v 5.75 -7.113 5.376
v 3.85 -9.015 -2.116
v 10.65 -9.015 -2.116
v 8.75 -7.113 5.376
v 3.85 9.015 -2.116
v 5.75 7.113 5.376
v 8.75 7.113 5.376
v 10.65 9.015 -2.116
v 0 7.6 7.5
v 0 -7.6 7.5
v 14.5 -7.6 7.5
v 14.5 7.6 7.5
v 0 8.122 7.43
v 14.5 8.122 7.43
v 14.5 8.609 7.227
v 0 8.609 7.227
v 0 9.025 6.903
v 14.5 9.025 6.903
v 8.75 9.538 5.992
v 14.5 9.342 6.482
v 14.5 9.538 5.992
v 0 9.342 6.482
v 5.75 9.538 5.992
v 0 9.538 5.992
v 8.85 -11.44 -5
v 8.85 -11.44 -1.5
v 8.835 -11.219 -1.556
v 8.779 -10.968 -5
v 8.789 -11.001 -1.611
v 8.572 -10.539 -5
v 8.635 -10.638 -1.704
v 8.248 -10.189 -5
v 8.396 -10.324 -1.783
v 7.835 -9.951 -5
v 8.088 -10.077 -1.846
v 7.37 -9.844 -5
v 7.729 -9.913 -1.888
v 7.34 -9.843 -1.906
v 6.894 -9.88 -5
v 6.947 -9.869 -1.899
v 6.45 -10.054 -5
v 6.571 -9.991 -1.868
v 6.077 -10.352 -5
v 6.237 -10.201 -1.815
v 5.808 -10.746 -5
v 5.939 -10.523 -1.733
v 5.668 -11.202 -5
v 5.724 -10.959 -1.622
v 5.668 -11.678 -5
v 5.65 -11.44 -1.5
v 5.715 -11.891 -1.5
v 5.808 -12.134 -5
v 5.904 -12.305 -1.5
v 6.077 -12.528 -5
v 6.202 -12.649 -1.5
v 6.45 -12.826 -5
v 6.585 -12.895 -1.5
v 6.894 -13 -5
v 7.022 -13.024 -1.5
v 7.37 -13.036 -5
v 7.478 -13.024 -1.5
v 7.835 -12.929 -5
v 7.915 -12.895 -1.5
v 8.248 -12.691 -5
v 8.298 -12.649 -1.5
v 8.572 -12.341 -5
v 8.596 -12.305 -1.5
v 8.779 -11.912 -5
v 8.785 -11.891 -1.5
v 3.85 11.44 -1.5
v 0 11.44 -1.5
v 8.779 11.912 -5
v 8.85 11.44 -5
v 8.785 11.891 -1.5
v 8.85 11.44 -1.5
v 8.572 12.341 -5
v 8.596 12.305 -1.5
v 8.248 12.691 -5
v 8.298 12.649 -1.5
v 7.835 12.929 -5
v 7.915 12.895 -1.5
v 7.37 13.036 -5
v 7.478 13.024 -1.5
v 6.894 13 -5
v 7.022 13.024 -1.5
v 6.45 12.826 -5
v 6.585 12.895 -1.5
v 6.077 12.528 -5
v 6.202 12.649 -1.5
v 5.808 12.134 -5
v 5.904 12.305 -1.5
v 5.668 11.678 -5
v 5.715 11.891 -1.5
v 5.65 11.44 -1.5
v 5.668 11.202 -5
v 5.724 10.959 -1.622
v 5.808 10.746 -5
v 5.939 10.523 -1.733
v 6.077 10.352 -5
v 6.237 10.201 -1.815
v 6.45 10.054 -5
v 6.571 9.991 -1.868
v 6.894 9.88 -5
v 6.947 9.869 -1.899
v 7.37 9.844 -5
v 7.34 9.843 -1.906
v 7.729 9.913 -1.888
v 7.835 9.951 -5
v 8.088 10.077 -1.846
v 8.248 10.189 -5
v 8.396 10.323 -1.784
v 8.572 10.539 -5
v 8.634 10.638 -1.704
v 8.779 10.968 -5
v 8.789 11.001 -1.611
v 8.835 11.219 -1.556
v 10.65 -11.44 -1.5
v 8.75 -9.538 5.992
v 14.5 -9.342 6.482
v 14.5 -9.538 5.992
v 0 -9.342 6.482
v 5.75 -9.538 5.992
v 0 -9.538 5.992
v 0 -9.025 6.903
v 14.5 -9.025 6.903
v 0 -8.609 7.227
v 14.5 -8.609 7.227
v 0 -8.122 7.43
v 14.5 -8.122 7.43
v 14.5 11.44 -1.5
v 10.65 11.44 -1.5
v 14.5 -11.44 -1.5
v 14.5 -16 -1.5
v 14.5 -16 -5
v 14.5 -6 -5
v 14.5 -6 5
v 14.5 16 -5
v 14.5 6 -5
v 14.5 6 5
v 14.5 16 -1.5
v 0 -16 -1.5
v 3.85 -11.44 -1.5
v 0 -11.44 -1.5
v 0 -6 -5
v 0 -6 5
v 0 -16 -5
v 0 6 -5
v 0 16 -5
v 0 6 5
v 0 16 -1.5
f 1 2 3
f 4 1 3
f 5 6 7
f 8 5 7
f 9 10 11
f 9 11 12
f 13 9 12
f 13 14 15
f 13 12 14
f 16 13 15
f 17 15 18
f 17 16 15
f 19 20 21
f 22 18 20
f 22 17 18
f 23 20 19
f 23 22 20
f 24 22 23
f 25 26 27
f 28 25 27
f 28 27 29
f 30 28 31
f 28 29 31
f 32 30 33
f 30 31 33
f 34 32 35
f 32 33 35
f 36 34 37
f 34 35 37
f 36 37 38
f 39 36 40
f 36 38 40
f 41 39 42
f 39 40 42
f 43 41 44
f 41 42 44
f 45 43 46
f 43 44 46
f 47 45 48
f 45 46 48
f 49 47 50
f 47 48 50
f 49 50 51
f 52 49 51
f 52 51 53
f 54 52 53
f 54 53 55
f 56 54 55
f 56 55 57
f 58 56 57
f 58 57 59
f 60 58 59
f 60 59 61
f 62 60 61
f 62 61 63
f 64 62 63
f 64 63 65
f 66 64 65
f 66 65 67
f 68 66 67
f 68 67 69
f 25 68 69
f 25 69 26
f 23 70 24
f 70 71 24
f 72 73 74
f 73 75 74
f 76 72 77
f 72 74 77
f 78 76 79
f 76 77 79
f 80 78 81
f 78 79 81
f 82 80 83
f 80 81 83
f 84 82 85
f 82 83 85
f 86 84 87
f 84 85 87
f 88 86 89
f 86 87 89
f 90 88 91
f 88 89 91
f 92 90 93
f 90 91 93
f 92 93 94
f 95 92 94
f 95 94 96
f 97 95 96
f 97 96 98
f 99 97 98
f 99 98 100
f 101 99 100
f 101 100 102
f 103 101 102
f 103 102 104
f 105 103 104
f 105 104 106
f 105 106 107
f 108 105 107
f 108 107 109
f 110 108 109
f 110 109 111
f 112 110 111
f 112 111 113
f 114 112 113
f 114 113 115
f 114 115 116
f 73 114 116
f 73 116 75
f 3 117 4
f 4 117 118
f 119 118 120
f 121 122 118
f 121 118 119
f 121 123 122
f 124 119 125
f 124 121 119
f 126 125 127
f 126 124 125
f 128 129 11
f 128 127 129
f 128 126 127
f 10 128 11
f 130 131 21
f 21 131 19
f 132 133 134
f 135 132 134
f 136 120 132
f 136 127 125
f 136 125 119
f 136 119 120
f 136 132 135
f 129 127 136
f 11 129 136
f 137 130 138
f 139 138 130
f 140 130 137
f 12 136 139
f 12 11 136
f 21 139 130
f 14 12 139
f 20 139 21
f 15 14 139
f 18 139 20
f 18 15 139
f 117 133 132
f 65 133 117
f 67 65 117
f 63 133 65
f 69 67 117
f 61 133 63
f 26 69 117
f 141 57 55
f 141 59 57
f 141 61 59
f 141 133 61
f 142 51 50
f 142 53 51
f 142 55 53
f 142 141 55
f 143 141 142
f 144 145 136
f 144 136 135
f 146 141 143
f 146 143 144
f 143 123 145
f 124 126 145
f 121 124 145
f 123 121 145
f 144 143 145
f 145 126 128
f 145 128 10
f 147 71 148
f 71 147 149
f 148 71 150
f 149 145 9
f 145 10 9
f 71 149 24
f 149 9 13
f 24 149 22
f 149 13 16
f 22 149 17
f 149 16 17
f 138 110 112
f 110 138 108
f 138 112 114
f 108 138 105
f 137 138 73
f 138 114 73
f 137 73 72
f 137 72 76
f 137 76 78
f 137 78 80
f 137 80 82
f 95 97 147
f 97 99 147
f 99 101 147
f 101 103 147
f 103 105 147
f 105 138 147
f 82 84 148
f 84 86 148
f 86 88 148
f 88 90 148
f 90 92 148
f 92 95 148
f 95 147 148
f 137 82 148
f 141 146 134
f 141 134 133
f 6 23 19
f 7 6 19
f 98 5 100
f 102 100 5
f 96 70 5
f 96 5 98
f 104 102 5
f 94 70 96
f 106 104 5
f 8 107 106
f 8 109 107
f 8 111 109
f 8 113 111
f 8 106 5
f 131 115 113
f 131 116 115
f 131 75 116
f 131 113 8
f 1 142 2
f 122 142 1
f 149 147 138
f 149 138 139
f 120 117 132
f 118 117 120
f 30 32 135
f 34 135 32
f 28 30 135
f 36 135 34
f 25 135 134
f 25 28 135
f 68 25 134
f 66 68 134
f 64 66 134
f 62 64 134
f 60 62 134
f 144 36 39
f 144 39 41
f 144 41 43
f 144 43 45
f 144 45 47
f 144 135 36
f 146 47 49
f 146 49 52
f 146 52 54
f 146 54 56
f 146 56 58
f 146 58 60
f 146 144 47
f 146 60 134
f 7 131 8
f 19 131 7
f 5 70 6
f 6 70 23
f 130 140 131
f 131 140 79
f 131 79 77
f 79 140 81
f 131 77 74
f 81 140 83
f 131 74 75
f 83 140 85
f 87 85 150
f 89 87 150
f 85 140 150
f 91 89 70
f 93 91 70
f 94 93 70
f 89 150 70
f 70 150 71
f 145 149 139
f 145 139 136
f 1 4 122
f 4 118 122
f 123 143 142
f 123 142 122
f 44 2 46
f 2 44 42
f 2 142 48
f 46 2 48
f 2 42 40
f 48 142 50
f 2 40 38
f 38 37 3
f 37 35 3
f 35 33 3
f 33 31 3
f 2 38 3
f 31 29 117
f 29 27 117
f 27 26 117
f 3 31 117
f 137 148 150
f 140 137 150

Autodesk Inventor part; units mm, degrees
ref_plane "YZ Plane" through (0, 0, 0) normal (1, 0, 0) x (0, 1, 0)
ref_plane "XZ Plane" through (0, 0, 0) normal (0, 1, 0) x (-1, 0, 0)
ref_plane "XY Plane" through (0, 0, 0) normal (0, 0, 1) x (1, 0, 0)
sketch "Sketch1" plane through (0, 0, 0) normal (1, 0, 0) x (0, 1, 0)
  line L0 (-6, -5) -> (0, -5) construction
  line L1 (6, -5) -> (6, 5)
  line L2 (6, 5) -> (-6, 5)
  line L3 (-6, 5) -> (-6, -5)
  line L4 (-6, -5) -> (6, 5) construction
  line L5 (6, -5) -> (-6, 5) construction
  line L6 (-7.5995, 7.5) -> (7.5995, 7.5)
  line L7 (9.1552, -7.5) -> (-9.1552, 7.5) construction
  line L8 (-9.1552, -7.5) -> (9.1552, 7.5) construction
  line L9 (9.1552, -7.5) -> (9, -7.5)
  line L10 (-9, -7.5) -> (-9.1552, -7.5)
  line L11 (-6, -5) -> (-16, -5)
  line L12 (-16, -5) -> (-16, -1.5)
  line L13 (-16, -1.5) -> (-11.44, -1.5)
  line L14 (-11.44, -1.5) -> (-9.538, 5.9921)
  line L15 (0, 0) -> (0, 13.1521) construction
  line L16 (9.1552, -7.5) -> (-9.1552, 7.5) construction
  line L17 (9, -7.5) -> (9.1552, -7.5)
  line L18 (6, -5) -> (16, -5)
  line L19 (16, -5) -> (16, -1.5)
  line L20 (16, -1.5) -> (11.44, -1.5)
  line L21 (11.44, -1.5) -> (9.538, 5.9921)
  arc A0 (-7.5995, 7.5) -> (-9.538, 5.9921) centre (-7.5995, 5.5) ccw
  arc A1 (9.538, 5.9921) -> (7.5995, 7.5) centre (7.5995, 5.5) ccw
  dimension "d0" = 12
  dimension "d1" = 10
  dimension "d2" = 2.5
  dimension "d3" = 10
  dimension "d4" = 3.5
  dimension "d5" = 4.56
  dimension "d6" = 2
extrude "Extrusion1" add sketch "Sketch1" along normal blind 14.5
sketch "Sketch2" plane through (0, 9.538, 5.9921) normal (0, 0.9693, 0.2461) x (1, 0, 0)
  line L0 (0, 7.7298) -> (14.5, 7.7298) projected
  line L1 (7.25, 7.7298) -> (15.5846, 7.7298) construction
  line L2 (7.25, 7.7298) -> (7.25, 0) construction
  line L3 (7.25, 0) -> (8.75, 0)
  line L4 (0, 0) -> (14.5, 0) projected
  line L5 (7.25, 0) -> (5.75, 0)
  line L6 (7.25, 7.7298) -> (10.65, 7.7298)
  line L7 (7.25, 7.7298) -> (3.85, 7.7298)
  line L8 (3.85, 7.7298) -> (5.75, 0)
  line L9 (10.65, 7.7298) -> (8.75, 0)
  point P0 (0, 3.461)
  point P1 (10.65, 7.7298)
  dimension "d13" = 1.5
  dimension "d14" = 1.5
  dimension "d15" = 3.4
  dimension "d16" = 3.4
extrude "Extrusion2" cut sketch "Sketch2" against normal blind 2.5
sketch "Sketch3" plane through (0, 11.44, -1.5) normal (0, 0, 1) x (1, 0, 0)
  line L0 (0, 4.56) -> (14.5, 4.56) construction
  line L1 (14.5, 4.56) -> (7.25, 0) construction
  line L2 (3.85, 0) -> (10.65, 0) construction
  line L3 (0, 4.56) -> (7.25, 0) construction
  circle A0 centre (7.25, 0) radius 1.6
  point P0 (0, -11.44)
  dimension "d19" = 3.2
extrude "Extrusion3" cut sketch "Sketch3" against normal blind 4
sketch "Sketch4" plane through (0, -11.44, -1.5) normal (0, -0.9693, 0.2461) x (1, 0, 0)
  line L0 (0, 0) -> (14.5, 0) projected
  line L1 (7.25, 0) -> (10.65, 0) construction
  line L2 (7.25, 0) -> (7.25, 7.6387) construction
  line L3 (7.25, 0) -> (3.85, 0) construction
  line L4 (7.25, 0) -> (10.65, 0)
  line L5 (7.25, 0) -> (3.85, 0)
  line L6 (7.25, 7.3642) -> (7.25, 7.7298) construction
  line L7 (0, 7.7298) -> (14.5, 7.7298) construction
  line L8 (7.25, 7.7298) -> (5.75, 7.7298)
  line L9 (7.25, 7.7298) -> (8.75, 7.7298)
  line L10 (3.85, 0) -> (5.75, 7.7298)
  line L11 (10.65, 0) -> (8.75, 7.7298)
  point P0 (0, 4.2688)
  dimension "d22" = 3.4
  dimension "d23" = 3.4
  dimension "d25" = 1.5
  dimension "d26" = 1.5
extrude "Extrusion4" cut sketch "Sketch4" against normal blind 2.5
sketch "Sketch5" plane through (0, -16, -1.5) normal (0, 0, 1) x (1, 0, 0)
  line L0 (0, 4.56) -> (0, 0) construction
  line L1 (0, 0) -> (7.25, 4.56) construction
  line L2 (3.85, 4.56) -> (10.65, 4.56) construction
  line L3 (14.5, 4.56) -> (14.5, 0) construction
  line L4 (14.5, 0) -> (7.25, 4.56) construction
  circle A0 centre (7.25, 4.56) radius 1.6
  point P0 (0, 16)
  dimension "d29" = 3.2
extrude "Extrusion5" cut sketch "Sketch5" against normal blind 4
properties part number "soporte_motor"
